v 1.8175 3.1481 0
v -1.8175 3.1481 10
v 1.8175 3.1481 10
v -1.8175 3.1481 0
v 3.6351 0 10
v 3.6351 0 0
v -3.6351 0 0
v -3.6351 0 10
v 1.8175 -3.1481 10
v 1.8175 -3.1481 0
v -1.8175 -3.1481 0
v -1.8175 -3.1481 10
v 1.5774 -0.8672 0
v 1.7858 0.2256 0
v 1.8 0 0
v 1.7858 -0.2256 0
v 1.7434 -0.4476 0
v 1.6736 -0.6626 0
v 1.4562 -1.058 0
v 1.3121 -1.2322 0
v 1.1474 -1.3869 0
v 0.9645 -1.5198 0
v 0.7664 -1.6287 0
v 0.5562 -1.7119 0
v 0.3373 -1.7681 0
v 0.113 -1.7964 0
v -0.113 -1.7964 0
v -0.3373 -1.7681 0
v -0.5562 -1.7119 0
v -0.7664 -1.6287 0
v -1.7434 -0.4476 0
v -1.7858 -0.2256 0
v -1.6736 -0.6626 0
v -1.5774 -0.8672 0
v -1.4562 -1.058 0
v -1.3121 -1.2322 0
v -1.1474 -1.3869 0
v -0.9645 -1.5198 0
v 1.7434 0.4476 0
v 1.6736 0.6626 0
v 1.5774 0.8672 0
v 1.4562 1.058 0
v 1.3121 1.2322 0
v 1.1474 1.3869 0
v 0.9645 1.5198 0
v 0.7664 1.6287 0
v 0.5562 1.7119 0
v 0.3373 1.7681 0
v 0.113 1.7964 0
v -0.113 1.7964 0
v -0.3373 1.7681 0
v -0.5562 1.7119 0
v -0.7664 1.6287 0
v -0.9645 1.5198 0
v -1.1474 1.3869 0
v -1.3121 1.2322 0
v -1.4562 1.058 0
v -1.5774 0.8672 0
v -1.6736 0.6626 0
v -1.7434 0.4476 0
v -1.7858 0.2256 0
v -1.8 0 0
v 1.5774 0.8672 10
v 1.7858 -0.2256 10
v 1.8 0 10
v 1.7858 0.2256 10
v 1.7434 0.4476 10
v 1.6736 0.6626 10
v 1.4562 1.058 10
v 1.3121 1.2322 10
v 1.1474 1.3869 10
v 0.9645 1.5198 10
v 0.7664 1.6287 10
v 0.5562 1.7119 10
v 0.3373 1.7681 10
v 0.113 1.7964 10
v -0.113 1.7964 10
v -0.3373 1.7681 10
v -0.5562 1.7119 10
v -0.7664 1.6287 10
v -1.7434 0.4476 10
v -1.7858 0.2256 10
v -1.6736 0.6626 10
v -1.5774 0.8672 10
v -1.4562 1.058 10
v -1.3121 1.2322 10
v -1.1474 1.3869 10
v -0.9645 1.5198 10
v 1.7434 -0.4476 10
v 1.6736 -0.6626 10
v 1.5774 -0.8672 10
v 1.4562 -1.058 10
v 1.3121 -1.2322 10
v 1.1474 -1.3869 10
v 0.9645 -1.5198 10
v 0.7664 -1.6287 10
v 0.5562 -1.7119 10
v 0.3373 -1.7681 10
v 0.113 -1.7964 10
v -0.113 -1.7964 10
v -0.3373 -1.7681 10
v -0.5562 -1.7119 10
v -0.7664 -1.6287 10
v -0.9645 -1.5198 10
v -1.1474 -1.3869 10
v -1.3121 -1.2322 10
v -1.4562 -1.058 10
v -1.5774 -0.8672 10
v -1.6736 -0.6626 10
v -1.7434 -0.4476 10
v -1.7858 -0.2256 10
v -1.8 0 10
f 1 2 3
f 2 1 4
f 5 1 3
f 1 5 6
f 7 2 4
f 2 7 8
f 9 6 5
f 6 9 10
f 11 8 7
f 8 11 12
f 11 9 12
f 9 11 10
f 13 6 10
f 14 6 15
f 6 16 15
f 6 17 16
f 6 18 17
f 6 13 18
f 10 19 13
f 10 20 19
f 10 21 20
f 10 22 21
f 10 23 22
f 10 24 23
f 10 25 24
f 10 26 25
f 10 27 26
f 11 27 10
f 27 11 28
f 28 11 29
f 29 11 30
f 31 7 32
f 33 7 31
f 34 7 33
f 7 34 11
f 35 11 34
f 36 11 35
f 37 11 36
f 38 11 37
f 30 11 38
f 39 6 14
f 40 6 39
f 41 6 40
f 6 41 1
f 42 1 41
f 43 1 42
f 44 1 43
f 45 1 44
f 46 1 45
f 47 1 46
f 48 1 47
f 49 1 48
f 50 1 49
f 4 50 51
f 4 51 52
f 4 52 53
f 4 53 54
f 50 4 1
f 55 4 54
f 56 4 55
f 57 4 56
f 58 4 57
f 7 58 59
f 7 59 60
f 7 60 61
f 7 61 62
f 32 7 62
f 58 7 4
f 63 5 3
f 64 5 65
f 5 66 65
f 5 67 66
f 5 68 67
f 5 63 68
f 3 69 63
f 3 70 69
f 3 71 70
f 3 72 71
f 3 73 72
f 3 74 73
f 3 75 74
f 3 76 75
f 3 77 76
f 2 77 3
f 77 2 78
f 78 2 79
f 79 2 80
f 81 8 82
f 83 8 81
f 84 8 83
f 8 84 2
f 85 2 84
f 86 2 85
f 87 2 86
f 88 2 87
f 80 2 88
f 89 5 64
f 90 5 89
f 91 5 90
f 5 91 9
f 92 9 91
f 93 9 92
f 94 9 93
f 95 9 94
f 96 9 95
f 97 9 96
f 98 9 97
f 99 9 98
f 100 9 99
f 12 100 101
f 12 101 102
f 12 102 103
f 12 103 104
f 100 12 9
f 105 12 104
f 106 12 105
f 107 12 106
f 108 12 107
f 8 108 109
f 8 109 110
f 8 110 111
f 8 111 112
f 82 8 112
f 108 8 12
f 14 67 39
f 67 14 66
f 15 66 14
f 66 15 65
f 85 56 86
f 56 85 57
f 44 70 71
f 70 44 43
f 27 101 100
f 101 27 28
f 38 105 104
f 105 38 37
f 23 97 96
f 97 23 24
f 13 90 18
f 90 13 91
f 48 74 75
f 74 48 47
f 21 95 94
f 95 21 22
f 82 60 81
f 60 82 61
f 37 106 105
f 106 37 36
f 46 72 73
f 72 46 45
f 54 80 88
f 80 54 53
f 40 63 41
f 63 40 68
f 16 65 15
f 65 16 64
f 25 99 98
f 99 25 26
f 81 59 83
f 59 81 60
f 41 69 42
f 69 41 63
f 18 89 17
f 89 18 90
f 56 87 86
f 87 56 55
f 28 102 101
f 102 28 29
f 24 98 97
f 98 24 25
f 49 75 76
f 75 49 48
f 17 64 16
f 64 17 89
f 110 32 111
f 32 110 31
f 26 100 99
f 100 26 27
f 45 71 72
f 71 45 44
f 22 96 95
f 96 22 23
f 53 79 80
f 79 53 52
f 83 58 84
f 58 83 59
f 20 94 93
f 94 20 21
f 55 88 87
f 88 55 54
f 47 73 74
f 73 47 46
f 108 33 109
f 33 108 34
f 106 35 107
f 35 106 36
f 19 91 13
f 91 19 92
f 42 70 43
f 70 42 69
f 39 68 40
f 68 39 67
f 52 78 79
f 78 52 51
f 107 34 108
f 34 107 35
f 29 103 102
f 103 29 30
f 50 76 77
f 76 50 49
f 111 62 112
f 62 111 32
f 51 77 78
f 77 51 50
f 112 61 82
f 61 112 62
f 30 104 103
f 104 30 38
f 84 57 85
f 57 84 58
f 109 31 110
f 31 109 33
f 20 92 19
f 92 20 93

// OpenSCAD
$fn = 50;


difference() {
	union() {
		linear_extrude(height = 10) {
			polygon(points = [[3.6351000000, 0.0000000000], [1.8175500000, 3.1480889453], [-1.8175500000, 3.1480889453], [-3.6351000000, 0.0000000000], [-1.8175500000, -3.1480889453], [1.8175500000, -3.1480889453]]);
		}
	}
	union() {
		cylinder(h = 10, r = 1.8000000000);
	}
}
